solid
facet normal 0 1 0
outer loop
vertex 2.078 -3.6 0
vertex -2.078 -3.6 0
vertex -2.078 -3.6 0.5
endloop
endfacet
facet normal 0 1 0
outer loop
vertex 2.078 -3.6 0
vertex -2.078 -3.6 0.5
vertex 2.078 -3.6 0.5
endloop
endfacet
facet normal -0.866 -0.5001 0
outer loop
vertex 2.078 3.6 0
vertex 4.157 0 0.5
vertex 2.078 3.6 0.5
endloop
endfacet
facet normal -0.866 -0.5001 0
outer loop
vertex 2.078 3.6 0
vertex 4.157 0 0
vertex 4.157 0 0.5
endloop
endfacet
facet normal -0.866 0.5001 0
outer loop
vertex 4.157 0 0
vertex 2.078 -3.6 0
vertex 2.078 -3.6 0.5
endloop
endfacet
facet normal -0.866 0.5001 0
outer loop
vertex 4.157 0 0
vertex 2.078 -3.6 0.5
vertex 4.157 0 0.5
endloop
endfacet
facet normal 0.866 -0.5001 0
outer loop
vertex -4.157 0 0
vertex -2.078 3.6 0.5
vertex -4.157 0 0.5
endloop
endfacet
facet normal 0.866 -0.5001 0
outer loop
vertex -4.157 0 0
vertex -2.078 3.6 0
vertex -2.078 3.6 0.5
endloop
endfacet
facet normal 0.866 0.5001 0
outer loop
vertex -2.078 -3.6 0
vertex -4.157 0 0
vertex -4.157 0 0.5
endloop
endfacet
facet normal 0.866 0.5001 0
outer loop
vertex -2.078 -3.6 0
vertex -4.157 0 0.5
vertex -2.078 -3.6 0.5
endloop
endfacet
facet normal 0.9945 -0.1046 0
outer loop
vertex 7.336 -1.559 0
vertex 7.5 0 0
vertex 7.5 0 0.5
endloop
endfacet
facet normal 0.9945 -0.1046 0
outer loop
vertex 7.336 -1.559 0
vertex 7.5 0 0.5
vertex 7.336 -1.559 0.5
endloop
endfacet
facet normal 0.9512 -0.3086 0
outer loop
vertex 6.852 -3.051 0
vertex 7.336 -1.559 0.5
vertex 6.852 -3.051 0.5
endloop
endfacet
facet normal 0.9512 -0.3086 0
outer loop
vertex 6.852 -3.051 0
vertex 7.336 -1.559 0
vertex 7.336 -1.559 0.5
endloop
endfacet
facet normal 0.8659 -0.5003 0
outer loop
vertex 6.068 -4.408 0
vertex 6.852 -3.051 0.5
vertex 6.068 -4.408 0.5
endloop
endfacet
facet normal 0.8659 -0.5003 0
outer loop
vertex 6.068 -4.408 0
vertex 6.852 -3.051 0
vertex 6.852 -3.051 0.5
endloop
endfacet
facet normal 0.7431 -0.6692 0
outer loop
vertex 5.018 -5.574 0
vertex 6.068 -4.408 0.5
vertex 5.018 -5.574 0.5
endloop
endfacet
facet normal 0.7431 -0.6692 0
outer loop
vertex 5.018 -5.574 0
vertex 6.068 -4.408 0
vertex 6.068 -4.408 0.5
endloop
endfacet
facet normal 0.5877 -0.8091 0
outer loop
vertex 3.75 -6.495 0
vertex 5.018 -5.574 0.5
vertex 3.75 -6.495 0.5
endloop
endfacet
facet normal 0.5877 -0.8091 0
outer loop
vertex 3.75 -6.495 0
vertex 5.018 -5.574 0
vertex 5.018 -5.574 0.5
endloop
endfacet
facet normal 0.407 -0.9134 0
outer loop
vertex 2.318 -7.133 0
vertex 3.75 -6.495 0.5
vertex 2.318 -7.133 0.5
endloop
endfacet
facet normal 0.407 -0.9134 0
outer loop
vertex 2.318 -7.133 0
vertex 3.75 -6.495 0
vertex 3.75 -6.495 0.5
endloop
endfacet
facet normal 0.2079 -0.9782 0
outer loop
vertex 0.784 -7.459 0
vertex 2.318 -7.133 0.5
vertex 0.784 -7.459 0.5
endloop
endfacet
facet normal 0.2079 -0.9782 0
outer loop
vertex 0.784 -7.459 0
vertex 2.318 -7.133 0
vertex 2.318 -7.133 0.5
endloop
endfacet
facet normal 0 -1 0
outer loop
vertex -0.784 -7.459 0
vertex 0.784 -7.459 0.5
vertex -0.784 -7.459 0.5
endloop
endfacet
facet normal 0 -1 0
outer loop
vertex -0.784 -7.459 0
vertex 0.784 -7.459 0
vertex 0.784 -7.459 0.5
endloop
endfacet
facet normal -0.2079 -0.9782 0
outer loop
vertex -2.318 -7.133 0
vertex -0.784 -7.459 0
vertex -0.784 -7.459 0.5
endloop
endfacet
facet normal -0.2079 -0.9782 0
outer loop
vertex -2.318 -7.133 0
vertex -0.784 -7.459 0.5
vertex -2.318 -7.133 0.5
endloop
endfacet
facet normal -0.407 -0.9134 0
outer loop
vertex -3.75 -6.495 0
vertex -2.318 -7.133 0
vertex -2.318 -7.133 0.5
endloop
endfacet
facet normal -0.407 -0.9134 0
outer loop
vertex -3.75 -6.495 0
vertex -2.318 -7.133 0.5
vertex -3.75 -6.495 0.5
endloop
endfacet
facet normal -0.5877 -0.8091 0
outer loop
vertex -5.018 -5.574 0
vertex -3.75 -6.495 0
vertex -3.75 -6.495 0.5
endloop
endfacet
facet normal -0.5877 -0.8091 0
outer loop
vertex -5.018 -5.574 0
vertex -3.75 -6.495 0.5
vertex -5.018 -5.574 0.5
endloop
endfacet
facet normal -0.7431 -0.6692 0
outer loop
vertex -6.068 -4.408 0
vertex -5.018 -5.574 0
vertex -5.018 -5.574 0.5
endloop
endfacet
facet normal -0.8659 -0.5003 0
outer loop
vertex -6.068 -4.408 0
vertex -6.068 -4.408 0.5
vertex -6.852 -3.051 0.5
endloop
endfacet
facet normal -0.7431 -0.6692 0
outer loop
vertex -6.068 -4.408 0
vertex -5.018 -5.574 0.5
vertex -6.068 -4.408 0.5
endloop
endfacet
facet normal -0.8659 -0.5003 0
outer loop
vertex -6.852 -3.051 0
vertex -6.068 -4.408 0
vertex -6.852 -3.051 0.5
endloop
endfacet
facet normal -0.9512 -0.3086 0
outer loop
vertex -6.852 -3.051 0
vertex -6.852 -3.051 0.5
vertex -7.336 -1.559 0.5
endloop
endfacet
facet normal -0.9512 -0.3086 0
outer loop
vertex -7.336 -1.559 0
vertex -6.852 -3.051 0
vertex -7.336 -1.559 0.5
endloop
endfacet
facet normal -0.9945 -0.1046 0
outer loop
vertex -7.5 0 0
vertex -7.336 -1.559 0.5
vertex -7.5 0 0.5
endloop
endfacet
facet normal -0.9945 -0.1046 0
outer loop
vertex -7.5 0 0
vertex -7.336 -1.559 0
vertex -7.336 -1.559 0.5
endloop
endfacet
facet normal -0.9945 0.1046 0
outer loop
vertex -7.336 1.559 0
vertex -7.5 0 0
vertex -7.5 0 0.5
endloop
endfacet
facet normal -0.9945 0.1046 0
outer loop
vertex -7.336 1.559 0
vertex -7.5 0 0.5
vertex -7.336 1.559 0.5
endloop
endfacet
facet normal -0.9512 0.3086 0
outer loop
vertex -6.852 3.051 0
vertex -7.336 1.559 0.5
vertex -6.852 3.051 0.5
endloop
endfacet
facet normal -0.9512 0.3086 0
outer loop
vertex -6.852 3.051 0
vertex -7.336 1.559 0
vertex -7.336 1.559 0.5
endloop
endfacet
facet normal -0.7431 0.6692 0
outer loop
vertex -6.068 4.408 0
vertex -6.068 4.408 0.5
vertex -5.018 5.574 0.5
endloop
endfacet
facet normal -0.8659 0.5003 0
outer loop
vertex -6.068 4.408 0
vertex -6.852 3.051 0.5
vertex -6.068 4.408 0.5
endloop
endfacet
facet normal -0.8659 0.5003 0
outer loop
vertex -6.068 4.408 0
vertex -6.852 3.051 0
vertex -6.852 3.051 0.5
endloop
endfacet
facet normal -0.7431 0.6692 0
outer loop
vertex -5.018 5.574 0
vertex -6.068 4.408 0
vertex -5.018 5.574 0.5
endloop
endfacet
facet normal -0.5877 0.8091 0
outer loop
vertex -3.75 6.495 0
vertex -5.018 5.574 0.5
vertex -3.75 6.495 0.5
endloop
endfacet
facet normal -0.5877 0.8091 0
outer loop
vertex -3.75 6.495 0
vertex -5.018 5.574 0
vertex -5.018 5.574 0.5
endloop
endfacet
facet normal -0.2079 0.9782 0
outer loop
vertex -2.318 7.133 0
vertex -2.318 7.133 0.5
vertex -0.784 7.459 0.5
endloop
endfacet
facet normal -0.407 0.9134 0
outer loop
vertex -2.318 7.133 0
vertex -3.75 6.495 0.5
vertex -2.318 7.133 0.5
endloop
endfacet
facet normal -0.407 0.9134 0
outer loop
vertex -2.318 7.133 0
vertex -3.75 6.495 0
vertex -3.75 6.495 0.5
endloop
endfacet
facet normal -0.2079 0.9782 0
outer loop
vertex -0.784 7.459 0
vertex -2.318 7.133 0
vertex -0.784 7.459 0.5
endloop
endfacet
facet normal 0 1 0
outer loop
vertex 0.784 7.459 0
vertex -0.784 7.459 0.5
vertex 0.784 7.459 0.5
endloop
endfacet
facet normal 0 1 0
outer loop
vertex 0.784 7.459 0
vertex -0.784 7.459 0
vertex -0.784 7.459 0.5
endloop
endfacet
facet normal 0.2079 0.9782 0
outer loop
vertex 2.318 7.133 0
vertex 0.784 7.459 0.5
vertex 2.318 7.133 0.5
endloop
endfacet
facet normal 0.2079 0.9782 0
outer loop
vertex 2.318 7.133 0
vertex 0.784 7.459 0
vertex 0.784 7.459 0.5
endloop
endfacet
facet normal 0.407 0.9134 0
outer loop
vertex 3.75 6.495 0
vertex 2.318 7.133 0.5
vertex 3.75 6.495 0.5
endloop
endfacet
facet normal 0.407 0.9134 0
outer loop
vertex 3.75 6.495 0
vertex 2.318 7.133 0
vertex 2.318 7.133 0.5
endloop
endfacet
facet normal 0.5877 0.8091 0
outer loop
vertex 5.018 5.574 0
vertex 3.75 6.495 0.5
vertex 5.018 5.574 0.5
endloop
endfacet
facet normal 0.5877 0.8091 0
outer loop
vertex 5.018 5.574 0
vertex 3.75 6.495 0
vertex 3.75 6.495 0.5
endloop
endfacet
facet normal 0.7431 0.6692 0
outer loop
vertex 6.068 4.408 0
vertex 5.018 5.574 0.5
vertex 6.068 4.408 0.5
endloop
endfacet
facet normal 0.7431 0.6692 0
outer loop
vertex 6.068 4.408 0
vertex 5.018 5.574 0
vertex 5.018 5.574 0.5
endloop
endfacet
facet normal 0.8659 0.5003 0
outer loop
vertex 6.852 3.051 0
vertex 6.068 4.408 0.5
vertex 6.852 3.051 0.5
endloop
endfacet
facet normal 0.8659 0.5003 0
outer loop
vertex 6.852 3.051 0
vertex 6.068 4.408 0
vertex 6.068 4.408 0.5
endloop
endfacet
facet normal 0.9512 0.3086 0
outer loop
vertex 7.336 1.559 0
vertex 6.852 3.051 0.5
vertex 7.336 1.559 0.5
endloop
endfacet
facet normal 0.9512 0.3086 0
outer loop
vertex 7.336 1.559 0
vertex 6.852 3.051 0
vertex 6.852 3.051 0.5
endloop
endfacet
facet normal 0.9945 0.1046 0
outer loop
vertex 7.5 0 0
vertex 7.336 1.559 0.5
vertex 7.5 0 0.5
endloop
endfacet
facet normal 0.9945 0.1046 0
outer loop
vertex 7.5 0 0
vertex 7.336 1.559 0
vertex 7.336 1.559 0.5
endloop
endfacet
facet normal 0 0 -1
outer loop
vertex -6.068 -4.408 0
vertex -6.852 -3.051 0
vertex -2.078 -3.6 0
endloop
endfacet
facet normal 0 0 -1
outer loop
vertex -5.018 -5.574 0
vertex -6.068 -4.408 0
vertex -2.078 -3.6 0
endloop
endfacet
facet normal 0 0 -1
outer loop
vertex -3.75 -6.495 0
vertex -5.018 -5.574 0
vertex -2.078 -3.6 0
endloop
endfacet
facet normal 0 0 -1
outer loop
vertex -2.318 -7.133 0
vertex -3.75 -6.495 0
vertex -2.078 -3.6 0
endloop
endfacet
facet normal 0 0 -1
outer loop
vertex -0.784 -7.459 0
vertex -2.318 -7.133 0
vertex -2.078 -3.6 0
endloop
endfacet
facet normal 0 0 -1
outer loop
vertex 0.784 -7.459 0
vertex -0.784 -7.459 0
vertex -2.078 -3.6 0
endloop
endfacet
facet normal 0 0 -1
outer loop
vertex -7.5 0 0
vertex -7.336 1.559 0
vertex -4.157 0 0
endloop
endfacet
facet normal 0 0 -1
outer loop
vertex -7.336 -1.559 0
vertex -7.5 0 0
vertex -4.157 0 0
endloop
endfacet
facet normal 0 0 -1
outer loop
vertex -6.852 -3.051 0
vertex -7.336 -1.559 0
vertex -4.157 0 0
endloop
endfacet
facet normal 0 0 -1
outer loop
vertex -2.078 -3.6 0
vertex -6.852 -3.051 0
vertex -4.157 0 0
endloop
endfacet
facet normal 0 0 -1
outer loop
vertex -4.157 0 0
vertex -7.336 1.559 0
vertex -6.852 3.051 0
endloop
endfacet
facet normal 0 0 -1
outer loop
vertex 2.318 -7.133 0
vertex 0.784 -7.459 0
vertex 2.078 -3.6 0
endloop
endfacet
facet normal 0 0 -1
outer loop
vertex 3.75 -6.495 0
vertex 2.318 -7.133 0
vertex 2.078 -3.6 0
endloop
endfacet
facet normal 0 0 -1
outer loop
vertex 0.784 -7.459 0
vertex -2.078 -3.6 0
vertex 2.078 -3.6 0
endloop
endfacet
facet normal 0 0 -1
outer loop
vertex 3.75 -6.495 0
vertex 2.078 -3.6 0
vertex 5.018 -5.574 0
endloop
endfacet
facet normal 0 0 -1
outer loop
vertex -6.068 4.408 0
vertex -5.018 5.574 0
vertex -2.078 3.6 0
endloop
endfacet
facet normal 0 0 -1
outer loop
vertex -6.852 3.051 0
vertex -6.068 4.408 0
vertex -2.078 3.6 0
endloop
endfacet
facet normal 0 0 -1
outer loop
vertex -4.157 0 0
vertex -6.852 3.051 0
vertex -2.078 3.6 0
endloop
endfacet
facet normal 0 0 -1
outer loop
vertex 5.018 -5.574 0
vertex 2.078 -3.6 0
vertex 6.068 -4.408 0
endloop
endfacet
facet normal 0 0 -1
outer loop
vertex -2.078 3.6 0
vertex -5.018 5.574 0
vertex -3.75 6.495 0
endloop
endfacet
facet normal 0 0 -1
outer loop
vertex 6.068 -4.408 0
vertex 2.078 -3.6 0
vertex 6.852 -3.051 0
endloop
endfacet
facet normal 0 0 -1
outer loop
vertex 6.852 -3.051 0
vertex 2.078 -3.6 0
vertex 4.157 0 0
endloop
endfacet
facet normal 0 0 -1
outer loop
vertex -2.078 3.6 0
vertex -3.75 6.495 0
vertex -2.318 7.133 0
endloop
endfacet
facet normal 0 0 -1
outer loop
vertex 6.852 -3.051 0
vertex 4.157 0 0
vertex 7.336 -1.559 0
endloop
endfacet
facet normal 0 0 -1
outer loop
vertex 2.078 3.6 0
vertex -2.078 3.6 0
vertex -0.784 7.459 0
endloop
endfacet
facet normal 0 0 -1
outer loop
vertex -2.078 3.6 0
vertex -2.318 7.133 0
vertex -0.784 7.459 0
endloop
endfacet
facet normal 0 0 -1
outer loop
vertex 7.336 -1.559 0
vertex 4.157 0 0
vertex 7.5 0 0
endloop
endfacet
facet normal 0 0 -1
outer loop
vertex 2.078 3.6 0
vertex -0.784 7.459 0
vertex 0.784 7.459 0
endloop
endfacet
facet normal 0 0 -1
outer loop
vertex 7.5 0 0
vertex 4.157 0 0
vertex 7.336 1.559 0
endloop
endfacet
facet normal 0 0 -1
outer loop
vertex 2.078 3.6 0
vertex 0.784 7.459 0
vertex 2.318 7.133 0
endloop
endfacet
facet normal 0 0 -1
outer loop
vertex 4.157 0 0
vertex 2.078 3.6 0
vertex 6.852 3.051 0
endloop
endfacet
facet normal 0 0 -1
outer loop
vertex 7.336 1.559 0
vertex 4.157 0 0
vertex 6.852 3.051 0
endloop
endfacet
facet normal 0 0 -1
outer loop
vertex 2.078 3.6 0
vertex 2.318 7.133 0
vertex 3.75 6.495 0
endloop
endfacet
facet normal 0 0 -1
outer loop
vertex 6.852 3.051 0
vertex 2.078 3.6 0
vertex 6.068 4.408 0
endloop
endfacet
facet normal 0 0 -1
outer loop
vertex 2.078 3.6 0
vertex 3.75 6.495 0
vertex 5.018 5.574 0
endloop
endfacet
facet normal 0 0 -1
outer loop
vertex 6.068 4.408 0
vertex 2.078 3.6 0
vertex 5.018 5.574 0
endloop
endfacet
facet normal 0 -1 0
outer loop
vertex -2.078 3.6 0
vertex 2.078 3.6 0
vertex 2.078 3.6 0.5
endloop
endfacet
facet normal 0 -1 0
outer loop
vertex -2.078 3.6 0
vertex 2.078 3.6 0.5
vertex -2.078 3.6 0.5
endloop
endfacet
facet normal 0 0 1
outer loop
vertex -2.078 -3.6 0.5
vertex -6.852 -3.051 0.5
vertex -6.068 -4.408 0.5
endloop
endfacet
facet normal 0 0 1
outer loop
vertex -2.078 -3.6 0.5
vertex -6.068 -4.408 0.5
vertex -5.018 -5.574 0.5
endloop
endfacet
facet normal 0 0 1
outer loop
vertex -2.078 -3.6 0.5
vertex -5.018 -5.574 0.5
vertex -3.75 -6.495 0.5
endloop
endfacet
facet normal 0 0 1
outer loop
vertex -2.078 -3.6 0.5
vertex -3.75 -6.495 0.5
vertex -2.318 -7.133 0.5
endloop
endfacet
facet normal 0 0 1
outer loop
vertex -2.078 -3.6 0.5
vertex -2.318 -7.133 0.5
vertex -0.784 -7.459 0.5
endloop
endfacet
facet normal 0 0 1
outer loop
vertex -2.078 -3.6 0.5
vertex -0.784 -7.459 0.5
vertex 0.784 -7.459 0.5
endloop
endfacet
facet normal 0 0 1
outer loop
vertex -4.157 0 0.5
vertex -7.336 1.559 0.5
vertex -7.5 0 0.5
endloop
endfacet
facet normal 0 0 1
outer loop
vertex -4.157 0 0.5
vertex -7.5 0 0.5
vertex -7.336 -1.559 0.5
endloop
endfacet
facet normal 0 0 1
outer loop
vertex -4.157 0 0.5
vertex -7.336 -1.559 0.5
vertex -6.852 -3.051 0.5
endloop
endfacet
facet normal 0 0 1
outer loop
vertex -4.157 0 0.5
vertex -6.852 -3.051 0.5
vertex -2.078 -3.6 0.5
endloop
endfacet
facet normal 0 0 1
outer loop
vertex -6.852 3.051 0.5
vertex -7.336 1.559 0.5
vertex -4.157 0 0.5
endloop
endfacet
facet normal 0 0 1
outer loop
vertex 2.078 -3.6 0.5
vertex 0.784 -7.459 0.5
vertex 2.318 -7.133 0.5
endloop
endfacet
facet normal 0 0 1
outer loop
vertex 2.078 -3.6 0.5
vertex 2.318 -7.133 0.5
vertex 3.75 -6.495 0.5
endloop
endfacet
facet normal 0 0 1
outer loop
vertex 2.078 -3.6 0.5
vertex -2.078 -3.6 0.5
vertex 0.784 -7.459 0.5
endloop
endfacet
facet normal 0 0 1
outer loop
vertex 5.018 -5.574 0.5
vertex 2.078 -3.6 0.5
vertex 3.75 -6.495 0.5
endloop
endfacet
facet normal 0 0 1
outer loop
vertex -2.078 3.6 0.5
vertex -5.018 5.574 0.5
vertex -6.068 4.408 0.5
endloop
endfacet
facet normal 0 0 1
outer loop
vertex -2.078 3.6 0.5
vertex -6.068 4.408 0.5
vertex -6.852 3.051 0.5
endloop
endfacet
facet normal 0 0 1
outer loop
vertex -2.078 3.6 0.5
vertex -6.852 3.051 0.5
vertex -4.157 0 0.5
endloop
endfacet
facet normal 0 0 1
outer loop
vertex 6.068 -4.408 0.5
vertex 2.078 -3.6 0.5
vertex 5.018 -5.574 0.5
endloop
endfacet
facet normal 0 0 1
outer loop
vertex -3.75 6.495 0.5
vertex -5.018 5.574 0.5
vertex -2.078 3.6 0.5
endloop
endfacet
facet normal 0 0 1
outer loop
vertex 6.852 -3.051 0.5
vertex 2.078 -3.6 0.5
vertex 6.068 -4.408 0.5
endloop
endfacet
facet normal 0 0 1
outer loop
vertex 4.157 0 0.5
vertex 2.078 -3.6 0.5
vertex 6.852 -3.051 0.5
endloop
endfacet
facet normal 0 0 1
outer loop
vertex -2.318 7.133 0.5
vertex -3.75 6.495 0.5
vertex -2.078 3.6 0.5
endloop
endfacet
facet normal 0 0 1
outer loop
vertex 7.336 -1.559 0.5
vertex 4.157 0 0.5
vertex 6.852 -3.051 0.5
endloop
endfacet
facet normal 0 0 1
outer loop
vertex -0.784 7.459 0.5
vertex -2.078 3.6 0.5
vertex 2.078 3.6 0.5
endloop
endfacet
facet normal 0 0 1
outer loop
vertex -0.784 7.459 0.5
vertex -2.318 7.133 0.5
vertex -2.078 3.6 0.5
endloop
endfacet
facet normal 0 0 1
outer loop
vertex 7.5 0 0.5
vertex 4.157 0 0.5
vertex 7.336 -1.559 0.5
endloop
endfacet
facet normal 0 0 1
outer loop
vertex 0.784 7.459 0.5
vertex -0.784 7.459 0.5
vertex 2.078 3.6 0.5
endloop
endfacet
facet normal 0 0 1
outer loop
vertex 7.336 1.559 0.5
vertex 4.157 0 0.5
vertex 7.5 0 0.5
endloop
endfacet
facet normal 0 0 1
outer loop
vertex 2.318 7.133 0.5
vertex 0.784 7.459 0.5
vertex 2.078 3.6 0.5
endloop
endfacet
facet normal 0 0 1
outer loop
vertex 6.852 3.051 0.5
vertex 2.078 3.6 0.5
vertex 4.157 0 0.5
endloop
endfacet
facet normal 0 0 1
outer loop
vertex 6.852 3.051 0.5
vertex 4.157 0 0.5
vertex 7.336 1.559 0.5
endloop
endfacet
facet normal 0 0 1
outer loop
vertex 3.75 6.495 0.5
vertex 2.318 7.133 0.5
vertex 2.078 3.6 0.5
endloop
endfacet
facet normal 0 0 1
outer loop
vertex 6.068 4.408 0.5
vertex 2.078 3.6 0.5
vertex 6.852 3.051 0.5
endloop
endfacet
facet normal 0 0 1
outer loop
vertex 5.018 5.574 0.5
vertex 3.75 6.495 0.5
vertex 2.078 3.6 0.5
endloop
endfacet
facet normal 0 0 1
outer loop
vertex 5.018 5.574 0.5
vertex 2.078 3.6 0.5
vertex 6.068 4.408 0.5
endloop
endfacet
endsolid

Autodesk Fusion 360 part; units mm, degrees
sketch "Sketch1" plane through (0, 0, 0) normal (0, 0, 1) x (1, 0, 0)
  circle A0 centre (0, 0) radius 9.5
  circle A1 centre (0, 0) radius 7.5
  line L0 (4.1569, 0) -> (2.0785, 3.6)
  line L1 (2.0785, 3.6) -> (-2.0785, 3.6)
  line L2 (-2.0785, 3.6) -> (-4.1569, 0)
  line L3 (-4.1569, 0) -> (-2.0785, -3.6)
  line L4 (-2.0785, -3.6) -> (2.0785, -3.6)
  line L5 (2.0785, -3.6) -> (4.1569, 0)
  line L6 (-4.1569, 0) -> (4.1569, 0) construction
  dimension "d1" = 19
  dimension "d2" = 15
  dimension "d3" = 7.2
extrude "Extrude1" add sketch "Sketch1" along normal blind 0.5 contours A1
extrude "Extrude2" [suppressed]
extrude "Extrude3" [suppressed]
